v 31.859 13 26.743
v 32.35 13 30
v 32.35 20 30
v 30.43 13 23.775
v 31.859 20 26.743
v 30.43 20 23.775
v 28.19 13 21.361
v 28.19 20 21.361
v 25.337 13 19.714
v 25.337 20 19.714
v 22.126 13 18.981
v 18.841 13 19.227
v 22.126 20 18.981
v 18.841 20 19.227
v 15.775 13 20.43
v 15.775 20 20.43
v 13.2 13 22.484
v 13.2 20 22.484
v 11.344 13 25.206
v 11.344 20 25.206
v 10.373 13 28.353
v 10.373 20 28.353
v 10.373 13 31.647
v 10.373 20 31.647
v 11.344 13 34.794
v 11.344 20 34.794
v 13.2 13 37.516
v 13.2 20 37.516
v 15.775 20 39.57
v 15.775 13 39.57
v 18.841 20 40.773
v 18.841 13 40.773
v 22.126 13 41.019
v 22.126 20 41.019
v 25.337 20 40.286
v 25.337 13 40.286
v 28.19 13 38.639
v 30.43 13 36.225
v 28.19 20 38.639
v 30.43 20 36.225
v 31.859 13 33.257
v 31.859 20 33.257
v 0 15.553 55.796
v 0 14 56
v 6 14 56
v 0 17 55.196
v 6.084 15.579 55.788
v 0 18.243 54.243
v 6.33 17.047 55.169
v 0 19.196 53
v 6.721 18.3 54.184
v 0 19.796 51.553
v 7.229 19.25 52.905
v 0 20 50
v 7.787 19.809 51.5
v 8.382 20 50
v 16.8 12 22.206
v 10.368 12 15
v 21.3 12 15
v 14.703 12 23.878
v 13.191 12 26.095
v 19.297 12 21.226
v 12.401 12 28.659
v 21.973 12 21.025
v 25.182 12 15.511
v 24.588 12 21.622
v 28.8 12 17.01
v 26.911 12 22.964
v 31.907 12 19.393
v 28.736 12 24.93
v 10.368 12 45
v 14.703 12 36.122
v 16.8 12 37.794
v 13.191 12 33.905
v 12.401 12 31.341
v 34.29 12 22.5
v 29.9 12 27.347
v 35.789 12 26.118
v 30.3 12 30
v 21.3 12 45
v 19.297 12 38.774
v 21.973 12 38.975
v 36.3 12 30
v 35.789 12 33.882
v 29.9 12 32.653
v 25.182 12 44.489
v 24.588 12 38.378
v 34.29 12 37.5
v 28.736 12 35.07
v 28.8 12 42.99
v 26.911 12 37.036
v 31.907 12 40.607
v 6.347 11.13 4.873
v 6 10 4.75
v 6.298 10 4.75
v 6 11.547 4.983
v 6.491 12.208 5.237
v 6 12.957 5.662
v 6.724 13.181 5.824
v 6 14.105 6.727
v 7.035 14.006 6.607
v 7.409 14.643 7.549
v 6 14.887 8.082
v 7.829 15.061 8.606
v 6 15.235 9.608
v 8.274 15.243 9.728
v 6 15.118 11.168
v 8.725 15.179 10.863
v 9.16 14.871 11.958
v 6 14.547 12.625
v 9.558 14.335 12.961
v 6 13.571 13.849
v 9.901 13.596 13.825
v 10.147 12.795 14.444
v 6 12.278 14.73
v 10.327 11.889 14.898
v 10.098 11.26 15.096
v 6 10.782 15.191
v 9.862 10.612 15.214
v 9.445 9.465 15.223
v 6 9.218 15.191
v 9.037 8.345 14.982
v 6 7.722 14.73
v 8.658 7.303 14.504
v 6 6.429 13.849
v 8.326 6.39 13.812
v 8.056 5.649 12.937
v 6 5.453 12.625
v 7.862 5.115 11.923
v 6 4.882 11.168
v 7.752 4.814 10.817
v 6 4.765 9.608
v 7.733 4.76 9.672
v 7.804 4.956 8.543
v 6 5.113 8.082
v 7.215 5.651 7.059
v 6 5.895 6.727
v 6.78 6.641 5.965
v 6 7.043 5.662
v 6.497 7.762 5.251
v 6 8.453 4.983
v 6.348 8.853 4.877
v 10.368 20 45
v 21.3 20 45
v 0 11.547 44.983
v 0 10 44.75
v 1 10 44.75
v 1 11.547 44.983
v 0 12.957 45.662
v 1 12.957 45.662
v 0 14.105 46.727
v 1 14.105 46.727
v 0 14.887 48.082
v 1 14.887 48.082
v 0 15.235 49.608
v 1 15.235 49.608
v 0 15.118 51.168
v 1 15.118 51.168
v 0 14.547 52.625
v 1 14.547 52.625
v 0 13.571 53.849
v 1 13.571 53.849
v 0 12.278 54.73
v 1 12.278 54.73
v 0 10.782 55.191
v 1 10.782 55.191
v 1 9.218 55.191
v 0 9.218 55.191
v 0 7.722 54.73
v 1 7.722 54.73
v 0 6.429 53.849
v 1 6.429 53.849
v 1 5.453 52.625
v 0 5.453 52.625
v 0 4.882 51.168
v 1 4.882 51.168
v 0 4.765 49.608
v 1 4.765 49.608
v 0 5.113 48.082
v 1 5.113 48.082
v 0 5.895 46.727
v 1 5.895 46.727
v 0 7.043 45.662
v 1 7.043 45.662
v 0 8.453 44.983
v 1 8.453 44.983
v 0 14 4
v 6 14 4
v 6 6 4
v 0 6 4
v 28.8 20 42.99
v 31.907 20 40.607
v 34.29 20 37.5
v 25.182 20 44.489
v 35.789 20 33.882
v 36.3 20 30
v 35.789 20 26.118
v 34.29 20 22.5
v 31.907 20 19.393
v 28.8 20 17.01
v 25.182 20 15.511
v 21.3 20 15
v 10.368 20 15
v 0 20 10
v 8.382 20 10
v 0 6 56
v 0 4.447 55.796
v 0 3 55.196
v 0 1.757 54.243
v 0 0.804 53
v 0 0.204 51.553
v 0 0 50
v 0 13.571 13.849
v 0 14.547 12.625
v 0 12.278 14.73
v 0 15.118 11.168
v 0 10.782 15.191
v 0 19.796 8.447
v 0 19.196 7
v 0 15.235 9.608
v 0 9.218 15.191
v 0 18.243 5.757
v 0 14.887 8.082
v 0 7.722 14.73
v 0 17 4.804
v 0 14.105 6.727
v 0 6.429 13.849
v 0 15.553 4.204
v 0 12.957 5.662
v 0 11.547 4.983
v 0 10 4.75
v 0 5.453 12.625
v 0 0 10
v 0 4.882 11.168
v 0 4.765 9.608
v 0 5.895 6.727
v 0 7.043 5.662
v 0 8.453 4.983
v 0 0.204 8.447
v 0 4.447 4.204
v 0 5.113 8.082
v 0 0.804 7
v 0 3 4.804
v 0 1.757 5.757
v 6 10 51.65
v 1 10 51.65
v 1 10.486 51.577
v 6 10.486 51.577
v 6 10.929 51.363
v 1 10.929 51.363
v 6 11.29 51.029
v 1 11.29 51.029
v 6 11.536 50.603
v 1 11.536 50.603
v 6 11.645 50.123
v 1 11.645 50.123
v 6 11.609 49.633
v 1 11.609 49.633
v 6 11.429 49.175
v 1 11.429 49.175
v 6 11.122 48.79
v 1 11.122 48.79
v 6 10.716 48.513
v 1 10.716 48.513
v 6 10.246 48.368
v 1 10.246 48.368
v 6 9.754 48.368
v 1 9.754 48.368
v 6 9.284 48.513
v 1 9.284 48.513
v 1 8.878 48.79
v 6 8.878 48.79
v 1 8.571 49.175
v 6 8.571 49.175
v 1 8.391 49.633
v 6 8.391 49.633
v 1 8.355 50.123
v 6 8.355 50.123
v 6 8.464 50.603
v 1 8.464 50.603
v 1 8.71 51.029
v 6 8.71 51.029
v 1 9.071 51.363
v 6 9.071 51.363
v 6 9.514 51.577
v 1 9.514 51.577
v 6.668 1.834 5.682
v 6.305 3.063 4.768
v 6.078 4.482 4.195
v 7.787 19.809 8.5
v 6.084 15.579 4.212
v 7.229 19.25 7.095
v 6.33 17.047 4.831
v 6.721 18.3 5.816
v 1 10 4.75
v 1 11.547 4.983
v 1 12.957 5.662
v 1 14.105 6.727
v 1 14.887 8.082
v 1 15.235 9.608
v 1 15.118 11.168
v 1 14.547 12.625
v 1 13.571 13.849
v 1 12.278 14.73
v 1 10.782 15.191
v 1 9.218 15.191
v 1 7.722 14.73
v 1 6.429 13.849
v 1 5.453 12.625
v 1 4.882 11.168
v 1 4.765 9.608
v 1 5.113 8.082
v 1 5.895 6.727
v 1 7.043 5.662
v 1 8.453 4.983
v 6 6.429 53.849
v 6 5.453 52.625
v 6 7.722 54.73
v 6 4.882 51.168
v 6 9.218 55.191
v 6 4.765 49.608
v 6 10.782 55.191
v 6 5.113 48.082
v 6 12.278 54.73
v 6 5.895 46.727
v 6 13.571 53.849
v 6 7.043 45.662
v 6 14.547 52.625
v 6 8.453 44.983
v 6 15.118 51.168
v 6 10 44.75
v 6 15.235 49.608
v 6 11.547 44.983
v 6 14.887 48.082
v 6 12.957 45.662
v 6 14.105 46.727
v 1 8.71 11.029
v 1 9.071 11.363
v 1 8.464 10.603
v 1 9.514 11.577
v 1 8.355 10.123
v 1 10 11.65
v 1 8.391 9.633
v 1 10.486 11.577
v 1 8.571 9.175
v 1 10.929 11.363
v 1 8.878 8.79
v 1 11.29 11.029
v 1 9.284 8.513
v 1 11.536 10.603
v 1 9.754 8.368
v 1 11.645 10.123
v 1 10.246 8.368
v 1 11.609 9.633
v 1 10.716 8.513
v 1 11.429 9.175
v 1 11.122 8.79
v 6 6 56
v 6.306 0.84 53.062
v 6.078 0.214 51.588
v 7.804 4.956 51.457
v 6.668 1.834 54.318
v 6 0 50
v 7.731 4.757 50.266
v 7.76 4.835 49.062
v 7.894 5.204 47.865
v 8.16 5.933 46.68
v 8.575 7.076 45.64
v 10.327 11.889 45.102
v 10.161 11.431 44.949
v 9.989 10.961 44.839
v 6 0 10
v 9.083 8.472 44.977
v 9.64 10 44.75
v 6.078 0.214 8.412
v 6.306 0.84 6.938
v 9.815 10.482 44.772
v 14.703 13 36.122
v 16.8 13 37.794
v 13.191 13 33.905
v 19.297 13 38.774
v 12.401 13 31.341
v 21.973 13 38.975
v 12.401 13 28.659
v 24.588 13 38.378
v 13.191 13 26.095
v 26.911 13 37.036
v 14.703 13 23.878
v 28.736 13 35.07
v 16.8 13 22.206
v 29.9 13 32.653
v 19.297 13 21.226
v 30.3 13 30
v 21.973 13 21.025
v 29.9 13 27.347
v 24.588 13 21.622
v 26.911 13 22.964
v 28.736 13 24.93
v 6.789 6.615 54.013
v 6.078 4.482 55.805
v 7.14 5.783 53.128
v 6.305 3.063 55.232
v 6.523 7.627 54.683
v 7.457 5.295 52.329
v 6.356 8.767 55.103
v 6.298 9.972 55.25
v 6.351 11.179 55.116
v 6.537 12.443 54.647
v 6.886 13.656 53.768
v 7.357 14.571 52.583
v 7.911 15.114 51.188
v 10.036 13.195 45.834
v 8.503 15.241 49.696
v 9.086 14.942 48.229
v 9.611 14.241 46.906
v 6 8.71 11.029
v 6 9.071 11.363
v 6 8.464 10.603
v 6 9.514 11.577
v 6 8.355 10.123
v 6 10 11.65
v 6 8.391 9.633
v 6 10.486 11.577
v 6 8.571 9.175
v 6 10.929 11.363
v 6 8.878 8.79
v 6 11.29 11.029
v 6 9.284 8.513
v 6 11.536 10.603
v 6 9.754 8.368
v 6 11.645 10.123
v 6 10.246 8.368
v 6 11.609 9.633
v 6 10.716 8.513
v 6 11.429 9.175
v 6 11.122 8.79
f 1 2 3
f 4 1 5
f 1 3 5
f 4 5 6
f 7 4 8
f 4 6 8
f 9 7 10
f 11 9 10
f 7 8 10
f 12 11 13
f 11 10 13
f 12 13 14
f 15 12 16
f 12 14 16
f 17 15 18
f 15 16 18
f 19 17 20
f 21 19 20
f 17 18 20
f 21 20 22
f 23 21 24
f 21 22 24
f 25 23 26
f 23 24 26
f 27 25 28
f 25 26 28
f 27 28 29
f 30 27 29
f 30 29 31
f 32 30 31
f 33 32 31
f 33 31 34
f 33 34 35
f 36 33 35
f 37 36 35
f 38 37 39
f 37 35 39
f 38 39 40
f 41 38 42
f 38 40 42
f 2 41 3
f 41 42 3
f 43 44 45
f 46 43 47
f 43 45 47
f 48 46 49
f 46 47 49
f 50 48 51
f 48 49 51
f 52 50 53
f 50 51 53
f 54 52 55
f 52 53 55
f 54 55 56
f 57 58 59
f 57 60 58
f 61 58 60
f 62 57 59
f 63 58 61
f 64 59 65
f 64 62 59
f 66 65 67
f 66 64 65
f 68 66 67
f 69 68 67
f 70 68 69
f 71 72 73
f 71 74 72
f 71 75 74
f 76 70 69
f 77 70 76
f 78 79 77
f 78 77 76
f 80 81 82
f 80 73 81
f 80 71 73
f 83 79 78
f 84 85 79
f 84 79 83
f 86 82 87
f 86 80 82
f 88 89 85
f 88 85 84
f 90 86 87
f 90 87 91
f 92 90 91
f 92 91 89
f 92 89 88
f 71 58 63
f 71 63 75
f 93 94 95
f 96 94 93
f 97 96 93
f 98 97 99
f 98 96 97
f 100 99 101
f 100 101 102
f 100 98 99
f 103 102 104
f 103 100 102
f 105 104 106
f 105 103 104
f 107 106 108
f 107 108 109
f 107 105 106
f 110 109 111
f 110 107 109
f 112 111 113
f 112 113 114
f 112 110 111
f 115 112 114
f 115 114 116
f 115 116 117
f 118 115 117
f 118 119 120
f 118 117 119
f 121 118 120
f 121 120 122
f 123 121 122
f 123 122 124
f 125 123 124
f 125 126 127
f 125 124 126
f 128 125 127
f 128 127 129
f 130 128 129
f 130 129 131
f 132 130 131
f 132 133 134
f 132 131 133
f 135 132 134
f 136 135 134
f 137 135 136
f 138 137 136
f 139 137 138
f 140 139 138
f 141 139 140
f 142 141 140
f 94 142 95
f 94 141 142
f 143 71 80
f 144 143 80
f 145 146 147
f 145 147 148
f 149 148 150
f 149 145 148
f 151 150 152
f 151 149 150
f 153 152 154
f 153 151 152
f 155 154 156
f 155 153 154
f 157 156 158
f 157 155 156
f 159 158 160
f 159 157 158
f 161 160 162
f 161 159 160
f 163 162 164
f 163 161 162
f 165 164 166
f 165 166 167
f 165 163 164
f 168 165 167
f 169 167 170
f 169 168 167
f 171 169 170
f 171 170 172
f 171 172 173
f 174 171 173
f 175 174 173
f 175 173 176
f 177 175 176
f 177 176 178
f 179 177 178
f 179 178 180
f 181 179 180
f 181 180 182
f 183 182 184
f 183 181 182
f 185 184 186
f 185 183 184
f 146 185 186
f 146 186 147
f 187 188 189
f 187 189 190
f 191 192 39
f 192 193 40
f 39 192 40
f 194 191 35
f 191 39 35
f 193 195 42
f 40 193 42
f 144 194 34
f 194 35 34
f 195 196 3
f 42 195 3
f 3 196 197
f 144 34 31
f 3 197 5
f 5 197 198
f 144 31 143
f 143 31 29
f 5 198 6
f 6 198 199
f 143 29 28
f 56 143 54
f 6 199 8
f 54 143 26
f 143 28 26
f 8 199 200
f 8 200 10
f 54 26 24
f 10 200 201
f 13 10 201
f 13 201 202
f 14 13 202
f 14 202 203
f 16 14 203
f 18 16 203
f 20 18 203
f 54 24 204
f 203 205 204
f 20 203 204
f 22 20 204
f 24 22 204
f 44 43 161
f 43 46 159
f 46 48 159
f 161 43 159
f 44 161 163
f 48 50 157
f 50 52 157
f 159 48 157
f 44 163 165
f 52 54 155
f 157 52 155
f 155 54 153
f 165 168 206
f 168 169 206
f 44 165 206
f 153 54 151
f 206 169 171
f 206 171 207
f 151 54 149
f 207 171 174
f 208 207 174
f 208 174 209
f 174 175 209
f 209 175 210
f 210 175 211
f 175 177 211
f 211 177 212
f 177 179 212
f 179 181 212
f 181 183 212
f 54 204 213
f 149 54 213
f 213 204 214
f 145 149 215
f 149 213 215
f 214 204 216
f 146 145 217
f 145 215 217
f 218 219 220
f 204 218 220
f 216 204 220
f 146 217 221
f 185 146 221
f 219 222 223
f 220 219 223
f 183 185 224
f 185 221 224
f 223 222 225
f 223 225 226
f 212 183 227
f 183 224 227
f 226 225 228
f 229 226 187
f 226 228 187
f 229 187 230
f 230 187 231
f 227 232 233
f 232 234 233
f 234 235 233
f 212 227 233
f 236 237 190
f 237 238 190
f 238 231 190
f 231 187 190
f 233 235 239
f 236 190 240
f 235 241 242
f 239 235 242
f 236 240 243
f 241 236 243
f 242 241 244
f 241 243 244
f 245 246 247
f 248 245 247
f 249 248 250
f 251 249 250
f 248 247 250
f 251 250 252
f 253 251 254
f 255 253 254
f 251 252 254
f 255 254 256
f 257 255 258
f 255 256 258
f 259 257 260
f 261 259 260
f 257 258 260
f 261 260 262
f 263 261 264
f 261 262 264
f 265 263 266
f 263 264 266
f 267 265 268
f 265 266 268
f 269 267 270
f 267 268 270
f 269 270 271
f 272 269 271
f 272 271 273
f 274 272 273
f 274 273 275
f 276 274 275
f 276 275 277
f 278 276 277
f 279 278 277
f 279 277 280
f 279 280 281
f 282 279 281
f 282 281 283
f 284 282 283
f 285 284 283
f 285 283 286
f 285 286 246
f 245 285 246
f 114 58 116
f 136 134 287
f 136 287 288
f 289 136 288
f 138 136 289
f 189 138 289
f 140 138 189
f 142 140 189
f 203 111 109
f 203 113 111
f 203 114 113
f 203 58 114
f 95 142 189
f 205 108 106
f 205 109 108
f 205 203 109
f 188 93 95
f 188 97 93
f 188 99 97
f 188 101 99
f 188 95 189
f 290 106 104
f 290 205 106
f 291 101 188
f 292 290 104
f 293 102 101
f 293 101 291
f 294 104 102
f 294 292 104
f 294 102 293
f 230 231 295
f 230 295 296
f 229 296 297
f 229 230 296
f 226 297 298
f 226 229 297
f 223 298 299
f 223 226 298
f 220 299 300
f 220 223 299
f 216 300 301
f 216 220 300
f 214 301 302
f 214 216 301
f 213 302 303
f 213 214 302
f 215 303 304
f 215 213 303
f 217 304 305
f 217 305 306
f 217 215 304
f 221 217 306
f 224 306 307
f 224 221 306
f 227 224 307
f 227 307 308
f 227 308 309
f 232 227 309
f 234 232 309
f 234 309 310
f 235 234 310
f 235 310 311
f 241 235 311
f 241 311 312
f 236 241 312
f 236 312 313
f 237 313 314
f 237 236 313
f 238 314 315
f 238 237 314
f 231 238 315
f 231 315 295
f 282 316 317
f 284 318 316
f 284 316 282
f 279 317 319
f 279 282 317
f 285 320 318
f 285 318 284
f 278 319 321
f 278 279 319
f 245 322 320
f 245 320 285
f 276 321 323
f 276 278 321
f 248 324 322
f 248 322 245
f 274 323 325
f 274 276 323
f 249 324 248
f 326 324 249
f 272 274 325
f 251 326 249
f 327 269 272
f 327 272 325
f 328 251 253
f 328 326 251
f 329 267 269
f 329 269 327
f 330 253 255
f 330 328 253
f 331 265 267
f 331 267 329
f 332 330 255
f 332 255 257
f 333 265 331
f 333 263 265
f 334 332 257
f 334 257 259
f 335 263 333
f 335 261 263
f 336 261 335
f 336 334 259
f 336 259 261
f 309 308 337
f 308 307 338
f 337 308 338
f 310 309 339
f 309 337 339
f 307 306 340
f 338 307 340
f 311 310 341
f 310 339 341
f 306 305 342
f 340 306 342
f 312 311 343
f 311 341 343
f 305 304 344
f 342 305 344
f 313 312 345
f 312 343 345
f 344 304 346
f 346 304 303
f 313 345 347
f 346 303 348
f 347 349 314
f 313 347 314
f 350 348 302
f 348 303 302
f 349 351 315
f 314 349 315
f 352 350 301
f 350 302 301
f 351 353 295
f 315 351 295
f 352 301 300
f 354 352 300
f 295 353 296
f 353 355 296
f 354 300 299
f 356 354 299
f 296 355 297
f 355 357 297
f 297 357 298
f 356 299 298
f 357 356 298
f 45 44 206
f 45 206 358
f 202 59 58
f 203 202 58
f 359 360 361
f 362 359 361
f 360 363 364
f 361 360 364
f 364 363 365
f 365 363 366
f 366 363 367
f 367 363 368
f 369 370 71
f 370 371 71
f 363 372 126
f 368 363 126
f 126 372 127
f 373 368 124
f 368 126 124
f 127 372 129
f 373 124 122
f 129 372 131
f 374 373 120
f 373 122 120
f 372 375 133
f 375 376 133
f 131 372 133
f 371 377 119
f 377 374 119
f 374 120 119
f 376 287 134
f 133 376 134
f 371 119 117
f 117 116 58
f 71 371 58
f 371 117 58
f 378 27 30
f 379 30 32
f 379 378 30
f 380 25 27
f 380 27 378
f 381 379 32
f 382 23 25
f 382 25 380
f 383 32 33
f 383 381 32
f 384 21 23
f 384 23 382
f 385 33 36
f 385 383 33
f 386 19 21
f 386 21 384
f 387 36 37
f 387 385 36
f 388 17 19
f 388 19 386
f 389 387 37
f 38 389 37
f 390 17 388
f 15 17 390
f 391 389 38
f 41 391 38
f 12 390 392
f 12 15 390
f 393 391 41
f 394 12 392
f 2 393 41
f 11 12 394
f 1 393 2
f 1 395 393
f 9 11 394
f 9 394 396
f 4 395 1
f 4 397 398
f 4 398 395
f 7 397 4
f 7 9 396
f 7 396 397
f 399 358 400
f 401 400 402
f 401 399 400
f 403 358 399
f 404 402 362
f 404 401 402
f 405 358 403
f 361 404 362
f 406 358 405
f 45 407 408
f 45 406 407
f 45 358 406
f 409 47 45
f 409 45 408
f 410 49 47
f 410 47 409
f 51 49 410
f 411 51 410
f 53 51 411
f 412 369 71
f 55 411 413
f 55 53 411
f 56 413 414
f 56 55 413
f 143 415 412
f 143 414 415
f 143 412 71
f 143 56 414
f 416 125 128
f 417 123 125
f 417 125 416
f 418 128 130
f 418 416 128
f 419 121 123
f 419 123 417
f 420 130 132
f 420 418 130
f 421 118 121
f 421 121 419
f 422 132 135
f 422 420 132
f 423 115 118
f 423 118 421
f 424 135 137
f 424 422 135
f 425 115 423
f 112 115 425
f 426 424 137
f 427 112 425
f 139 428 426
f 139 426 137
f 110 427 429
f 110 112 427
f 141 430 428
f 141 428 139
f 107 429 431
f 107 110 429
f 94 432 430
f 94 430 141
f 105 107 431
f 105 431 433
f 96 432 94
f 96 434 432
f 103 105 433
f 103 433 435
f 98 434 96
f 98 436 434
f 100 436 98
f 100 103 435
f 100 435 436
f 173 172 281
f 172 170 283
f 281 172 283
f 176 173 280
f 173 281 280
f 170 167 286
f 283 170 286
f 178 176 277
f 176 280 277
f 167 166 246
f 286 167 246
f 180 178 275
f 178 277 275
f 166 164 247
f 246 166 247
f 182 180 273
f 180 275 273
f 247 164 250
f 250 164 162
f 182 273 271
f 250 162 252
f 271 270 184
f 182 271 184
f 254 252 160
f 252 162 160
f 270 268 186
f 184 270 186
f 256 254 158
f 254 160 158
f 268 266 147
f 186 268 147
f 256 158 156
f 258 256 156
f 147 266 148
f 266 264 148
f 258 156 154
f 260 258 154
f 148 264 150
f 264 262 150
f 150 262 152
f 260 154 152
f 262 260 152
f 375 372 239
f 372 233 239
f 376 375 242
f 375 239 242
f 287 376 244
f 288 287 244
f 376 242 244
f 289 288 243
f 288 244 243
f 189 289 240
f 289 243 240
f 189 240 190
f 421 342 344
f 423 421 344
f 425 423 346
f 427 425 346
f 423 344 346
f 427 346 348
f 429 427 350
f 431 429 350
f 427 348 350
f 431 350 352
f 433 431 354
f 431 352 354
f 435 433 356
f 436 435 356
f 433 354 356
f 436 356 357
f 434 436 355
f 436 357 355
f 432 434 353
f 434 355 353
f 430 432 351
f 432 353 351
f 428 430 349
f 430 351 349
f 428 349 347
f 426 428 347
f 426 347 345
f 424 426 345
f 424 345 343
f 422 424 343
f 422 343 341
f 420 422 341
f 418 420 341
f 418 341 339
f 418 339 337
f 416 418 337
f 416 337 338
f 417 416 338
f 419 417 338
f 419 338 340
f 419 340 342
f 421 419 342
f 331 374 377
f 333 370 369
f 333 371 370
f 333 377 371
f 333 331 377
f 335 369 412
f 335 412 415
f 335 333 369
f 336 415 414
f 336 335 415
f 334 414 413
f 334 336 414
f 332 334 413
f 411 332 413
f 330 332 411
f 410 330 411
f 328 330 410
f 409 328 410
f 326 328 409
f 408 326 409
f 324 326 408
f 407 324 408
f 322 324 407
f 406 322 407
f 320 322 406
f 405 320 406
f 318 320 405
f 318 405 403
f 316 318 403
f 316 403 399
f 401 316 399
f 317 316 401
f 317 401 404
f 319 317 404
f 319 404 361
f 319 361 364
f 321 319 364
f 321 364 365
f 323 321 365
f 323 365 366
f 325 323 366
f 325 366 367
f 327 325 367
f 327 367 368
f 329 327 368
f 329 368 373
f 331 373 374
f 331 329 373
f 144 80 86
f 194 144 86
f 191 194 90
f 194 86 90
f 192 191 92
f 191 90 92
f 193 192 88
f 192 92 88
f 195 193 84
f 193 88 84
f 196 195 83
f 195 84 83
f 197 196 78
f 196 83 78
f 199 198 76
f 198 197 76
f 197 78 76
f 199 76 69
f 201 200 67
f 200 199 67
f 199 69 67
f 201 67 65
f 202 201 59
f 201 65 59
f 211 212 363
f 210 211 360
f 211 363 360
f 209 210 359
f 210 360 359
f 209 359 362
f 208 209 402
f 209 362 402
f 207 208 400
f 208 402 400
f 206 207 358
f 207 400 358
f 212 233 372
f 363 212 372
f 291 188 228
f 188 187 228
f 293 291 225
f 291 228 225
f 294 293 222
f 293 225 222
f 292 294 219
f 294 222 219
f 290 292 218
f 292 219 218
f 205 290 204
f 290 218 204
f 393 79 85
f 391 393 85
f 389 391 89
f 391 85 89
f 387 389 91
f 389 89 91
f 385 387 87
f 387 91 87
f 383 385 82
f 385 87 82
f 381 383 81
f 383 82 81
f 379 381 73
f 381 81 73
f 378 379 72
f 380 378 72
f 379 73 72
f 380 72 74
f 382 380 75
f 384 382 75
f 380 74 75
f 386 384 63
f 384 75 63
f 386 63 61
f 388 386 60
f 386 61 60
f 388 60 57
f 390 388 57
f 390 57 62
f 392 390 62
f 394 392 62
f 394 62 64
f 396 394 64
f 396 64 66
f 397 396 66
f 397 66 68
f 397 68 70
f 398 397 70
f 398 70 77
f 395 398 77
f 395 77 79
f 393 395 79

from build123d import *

# Parameters (mm, degrees)
RESSALTO_EXTRUS_O1_DEPTH   = 60
ESBO_O2_R                  = 9
CORTE_EXTRUS_O1_DEPTH      = 13
CORTE_EXTRUS_O1_DEPTH_BACK = 9
ESBO_O3_R                  = 1.65
CORTE_EXTRUS_O2_DEPTH      = 37.3
ESBO_O4_R                  = 11.05
CORTE_EXTRUS_O3_DEPTH      = 7
CORTE_EXTRUS_O5_START      = 6
ESBO_O7_R                  = 5.25
CORTE_EXTRUS_O5_DEPTH      = 10
ESBO_O7_2_R                = 5.25
CORTE_EXTRUS_O7_DEPTH      = 1
FILETE1_R                  = 6


with BuildPart() as part:
    # Esboço1 → Ressalto-extrusão1 (new body)
    with BuildSketch(Plane.XY):
        Polygon((0, 0), (6, 0), (10.367642811, 12), (49, 12), (49, 20), (0, 20), align=None)
    extrude(amount=RESSALTO_EXTRUS_O1_DEPTH)

    # Esboço2 → Corte-extrusão1 (cut, two sides)
    with BuildSketch(Plane.XZ.offset(-12)) as corte_extrus_o1_sk:
        with Locations((21.3, 30)):
            Circle(ESBO_O2_R)
        with BuildLine():
            Line((21.3, 15), (10.367642811, 15))
            Line((10.367642811, 15), (6, 4))
            Line((6, 4), (0, 4))
            Line((0, 4), (0, 0))
            Line((0, 0), (49, 0))
            Line((49, 0), (49, 60))
            Line((49, 60), (0, 60))
            Line((0, 60), (0, 56))
            Line((0, 56), (6, 56))
            Line((6, 56), (10.367642811, 45))
            Line((10.367642811, 45), (21.3, 45))
            ThreePointArc((21.3, 45), (36.3, 30), (21.3, 15))
        make_face()
    extrude(amount=CORTE_EXTRUS_O1_DEPTH, mode=Mode.SUBTRACT)
    extrude(corte_extrus_o1_sk.sketch, amount=-CORTE_EXTRUS_O1_DEPTH_BACK, mode=Mode.SUBTRACT)

    # Esboço3 → Corte-extrusão2 (cut, through all)
    with BuildSketch(Plane.ZY):
        with Locations((50, 10)):
            Circle(ESBO_O3_R)
        with Locations((10, 10)):
            Circle(ESBO_O3_R)
    extrude(amount=-CORTE_EXTRUS_O2_DEPTH, mode=Mode.SUBTRACT)

    # Esboço4 → Corte-extrusão3 (cut)
    with BuildSketch(Plane(origin=(0, 20, 0), x_dir=(1, 0, 0), z_dir=(0, 1, 0))):
        with Locations((21.3, -30)):
            Circle(ESBO_O4_R)
    extrude(amount=-CORTE_EXTRUS_O3_DEPTH, mode=Mode.SUBTRACT)

    # Esboço7 → Corte-extrusão5 (cut)
    with BuildSketch(Plane(origin=(0, 0, 0), x_dir=(0, 0, -1), z_dir=(1, 0, 0)).offset(CORTE_EXTRUS_O5_START)):
        with Locations((-50, 10)):
            Circle(ESBO_O7_R)
        with Locations((-10, 10)):
            Circle(ESBO_O7_R)
    extrude(amount=CORTE_EXTRUS_O5_DEPTH, mode=Mode.SUBTRACT)

    # Esboço7<2> → Corte-extrusão7 (cut)
    with BuildSketch(Plane(origin=(0, 0, 0), x_dir=(0, 0, -1), z_dir=(1, 0, 0))):
        with Locations((-50, 10)):
            Circle(ESBO_O7_2_R)
        with Locations((-10, 10)):
            Circle(ESBO_O7_2_R)
    extrude(amount=CORTE_EXTRUS_O7_DEPTH, mode=Mode.SUBTRACT)

    # Filete1
    filete1_edges = [part.edges().sort_by_distance(p)[0] for p in [
        (3, 0, 4),
        (3, 0, 56),
        (3, 20, 4),
        (3, 20, 56),
    ]]
    fillet(filete1_edges, radius=FILETE1_R)


solid = part.part
